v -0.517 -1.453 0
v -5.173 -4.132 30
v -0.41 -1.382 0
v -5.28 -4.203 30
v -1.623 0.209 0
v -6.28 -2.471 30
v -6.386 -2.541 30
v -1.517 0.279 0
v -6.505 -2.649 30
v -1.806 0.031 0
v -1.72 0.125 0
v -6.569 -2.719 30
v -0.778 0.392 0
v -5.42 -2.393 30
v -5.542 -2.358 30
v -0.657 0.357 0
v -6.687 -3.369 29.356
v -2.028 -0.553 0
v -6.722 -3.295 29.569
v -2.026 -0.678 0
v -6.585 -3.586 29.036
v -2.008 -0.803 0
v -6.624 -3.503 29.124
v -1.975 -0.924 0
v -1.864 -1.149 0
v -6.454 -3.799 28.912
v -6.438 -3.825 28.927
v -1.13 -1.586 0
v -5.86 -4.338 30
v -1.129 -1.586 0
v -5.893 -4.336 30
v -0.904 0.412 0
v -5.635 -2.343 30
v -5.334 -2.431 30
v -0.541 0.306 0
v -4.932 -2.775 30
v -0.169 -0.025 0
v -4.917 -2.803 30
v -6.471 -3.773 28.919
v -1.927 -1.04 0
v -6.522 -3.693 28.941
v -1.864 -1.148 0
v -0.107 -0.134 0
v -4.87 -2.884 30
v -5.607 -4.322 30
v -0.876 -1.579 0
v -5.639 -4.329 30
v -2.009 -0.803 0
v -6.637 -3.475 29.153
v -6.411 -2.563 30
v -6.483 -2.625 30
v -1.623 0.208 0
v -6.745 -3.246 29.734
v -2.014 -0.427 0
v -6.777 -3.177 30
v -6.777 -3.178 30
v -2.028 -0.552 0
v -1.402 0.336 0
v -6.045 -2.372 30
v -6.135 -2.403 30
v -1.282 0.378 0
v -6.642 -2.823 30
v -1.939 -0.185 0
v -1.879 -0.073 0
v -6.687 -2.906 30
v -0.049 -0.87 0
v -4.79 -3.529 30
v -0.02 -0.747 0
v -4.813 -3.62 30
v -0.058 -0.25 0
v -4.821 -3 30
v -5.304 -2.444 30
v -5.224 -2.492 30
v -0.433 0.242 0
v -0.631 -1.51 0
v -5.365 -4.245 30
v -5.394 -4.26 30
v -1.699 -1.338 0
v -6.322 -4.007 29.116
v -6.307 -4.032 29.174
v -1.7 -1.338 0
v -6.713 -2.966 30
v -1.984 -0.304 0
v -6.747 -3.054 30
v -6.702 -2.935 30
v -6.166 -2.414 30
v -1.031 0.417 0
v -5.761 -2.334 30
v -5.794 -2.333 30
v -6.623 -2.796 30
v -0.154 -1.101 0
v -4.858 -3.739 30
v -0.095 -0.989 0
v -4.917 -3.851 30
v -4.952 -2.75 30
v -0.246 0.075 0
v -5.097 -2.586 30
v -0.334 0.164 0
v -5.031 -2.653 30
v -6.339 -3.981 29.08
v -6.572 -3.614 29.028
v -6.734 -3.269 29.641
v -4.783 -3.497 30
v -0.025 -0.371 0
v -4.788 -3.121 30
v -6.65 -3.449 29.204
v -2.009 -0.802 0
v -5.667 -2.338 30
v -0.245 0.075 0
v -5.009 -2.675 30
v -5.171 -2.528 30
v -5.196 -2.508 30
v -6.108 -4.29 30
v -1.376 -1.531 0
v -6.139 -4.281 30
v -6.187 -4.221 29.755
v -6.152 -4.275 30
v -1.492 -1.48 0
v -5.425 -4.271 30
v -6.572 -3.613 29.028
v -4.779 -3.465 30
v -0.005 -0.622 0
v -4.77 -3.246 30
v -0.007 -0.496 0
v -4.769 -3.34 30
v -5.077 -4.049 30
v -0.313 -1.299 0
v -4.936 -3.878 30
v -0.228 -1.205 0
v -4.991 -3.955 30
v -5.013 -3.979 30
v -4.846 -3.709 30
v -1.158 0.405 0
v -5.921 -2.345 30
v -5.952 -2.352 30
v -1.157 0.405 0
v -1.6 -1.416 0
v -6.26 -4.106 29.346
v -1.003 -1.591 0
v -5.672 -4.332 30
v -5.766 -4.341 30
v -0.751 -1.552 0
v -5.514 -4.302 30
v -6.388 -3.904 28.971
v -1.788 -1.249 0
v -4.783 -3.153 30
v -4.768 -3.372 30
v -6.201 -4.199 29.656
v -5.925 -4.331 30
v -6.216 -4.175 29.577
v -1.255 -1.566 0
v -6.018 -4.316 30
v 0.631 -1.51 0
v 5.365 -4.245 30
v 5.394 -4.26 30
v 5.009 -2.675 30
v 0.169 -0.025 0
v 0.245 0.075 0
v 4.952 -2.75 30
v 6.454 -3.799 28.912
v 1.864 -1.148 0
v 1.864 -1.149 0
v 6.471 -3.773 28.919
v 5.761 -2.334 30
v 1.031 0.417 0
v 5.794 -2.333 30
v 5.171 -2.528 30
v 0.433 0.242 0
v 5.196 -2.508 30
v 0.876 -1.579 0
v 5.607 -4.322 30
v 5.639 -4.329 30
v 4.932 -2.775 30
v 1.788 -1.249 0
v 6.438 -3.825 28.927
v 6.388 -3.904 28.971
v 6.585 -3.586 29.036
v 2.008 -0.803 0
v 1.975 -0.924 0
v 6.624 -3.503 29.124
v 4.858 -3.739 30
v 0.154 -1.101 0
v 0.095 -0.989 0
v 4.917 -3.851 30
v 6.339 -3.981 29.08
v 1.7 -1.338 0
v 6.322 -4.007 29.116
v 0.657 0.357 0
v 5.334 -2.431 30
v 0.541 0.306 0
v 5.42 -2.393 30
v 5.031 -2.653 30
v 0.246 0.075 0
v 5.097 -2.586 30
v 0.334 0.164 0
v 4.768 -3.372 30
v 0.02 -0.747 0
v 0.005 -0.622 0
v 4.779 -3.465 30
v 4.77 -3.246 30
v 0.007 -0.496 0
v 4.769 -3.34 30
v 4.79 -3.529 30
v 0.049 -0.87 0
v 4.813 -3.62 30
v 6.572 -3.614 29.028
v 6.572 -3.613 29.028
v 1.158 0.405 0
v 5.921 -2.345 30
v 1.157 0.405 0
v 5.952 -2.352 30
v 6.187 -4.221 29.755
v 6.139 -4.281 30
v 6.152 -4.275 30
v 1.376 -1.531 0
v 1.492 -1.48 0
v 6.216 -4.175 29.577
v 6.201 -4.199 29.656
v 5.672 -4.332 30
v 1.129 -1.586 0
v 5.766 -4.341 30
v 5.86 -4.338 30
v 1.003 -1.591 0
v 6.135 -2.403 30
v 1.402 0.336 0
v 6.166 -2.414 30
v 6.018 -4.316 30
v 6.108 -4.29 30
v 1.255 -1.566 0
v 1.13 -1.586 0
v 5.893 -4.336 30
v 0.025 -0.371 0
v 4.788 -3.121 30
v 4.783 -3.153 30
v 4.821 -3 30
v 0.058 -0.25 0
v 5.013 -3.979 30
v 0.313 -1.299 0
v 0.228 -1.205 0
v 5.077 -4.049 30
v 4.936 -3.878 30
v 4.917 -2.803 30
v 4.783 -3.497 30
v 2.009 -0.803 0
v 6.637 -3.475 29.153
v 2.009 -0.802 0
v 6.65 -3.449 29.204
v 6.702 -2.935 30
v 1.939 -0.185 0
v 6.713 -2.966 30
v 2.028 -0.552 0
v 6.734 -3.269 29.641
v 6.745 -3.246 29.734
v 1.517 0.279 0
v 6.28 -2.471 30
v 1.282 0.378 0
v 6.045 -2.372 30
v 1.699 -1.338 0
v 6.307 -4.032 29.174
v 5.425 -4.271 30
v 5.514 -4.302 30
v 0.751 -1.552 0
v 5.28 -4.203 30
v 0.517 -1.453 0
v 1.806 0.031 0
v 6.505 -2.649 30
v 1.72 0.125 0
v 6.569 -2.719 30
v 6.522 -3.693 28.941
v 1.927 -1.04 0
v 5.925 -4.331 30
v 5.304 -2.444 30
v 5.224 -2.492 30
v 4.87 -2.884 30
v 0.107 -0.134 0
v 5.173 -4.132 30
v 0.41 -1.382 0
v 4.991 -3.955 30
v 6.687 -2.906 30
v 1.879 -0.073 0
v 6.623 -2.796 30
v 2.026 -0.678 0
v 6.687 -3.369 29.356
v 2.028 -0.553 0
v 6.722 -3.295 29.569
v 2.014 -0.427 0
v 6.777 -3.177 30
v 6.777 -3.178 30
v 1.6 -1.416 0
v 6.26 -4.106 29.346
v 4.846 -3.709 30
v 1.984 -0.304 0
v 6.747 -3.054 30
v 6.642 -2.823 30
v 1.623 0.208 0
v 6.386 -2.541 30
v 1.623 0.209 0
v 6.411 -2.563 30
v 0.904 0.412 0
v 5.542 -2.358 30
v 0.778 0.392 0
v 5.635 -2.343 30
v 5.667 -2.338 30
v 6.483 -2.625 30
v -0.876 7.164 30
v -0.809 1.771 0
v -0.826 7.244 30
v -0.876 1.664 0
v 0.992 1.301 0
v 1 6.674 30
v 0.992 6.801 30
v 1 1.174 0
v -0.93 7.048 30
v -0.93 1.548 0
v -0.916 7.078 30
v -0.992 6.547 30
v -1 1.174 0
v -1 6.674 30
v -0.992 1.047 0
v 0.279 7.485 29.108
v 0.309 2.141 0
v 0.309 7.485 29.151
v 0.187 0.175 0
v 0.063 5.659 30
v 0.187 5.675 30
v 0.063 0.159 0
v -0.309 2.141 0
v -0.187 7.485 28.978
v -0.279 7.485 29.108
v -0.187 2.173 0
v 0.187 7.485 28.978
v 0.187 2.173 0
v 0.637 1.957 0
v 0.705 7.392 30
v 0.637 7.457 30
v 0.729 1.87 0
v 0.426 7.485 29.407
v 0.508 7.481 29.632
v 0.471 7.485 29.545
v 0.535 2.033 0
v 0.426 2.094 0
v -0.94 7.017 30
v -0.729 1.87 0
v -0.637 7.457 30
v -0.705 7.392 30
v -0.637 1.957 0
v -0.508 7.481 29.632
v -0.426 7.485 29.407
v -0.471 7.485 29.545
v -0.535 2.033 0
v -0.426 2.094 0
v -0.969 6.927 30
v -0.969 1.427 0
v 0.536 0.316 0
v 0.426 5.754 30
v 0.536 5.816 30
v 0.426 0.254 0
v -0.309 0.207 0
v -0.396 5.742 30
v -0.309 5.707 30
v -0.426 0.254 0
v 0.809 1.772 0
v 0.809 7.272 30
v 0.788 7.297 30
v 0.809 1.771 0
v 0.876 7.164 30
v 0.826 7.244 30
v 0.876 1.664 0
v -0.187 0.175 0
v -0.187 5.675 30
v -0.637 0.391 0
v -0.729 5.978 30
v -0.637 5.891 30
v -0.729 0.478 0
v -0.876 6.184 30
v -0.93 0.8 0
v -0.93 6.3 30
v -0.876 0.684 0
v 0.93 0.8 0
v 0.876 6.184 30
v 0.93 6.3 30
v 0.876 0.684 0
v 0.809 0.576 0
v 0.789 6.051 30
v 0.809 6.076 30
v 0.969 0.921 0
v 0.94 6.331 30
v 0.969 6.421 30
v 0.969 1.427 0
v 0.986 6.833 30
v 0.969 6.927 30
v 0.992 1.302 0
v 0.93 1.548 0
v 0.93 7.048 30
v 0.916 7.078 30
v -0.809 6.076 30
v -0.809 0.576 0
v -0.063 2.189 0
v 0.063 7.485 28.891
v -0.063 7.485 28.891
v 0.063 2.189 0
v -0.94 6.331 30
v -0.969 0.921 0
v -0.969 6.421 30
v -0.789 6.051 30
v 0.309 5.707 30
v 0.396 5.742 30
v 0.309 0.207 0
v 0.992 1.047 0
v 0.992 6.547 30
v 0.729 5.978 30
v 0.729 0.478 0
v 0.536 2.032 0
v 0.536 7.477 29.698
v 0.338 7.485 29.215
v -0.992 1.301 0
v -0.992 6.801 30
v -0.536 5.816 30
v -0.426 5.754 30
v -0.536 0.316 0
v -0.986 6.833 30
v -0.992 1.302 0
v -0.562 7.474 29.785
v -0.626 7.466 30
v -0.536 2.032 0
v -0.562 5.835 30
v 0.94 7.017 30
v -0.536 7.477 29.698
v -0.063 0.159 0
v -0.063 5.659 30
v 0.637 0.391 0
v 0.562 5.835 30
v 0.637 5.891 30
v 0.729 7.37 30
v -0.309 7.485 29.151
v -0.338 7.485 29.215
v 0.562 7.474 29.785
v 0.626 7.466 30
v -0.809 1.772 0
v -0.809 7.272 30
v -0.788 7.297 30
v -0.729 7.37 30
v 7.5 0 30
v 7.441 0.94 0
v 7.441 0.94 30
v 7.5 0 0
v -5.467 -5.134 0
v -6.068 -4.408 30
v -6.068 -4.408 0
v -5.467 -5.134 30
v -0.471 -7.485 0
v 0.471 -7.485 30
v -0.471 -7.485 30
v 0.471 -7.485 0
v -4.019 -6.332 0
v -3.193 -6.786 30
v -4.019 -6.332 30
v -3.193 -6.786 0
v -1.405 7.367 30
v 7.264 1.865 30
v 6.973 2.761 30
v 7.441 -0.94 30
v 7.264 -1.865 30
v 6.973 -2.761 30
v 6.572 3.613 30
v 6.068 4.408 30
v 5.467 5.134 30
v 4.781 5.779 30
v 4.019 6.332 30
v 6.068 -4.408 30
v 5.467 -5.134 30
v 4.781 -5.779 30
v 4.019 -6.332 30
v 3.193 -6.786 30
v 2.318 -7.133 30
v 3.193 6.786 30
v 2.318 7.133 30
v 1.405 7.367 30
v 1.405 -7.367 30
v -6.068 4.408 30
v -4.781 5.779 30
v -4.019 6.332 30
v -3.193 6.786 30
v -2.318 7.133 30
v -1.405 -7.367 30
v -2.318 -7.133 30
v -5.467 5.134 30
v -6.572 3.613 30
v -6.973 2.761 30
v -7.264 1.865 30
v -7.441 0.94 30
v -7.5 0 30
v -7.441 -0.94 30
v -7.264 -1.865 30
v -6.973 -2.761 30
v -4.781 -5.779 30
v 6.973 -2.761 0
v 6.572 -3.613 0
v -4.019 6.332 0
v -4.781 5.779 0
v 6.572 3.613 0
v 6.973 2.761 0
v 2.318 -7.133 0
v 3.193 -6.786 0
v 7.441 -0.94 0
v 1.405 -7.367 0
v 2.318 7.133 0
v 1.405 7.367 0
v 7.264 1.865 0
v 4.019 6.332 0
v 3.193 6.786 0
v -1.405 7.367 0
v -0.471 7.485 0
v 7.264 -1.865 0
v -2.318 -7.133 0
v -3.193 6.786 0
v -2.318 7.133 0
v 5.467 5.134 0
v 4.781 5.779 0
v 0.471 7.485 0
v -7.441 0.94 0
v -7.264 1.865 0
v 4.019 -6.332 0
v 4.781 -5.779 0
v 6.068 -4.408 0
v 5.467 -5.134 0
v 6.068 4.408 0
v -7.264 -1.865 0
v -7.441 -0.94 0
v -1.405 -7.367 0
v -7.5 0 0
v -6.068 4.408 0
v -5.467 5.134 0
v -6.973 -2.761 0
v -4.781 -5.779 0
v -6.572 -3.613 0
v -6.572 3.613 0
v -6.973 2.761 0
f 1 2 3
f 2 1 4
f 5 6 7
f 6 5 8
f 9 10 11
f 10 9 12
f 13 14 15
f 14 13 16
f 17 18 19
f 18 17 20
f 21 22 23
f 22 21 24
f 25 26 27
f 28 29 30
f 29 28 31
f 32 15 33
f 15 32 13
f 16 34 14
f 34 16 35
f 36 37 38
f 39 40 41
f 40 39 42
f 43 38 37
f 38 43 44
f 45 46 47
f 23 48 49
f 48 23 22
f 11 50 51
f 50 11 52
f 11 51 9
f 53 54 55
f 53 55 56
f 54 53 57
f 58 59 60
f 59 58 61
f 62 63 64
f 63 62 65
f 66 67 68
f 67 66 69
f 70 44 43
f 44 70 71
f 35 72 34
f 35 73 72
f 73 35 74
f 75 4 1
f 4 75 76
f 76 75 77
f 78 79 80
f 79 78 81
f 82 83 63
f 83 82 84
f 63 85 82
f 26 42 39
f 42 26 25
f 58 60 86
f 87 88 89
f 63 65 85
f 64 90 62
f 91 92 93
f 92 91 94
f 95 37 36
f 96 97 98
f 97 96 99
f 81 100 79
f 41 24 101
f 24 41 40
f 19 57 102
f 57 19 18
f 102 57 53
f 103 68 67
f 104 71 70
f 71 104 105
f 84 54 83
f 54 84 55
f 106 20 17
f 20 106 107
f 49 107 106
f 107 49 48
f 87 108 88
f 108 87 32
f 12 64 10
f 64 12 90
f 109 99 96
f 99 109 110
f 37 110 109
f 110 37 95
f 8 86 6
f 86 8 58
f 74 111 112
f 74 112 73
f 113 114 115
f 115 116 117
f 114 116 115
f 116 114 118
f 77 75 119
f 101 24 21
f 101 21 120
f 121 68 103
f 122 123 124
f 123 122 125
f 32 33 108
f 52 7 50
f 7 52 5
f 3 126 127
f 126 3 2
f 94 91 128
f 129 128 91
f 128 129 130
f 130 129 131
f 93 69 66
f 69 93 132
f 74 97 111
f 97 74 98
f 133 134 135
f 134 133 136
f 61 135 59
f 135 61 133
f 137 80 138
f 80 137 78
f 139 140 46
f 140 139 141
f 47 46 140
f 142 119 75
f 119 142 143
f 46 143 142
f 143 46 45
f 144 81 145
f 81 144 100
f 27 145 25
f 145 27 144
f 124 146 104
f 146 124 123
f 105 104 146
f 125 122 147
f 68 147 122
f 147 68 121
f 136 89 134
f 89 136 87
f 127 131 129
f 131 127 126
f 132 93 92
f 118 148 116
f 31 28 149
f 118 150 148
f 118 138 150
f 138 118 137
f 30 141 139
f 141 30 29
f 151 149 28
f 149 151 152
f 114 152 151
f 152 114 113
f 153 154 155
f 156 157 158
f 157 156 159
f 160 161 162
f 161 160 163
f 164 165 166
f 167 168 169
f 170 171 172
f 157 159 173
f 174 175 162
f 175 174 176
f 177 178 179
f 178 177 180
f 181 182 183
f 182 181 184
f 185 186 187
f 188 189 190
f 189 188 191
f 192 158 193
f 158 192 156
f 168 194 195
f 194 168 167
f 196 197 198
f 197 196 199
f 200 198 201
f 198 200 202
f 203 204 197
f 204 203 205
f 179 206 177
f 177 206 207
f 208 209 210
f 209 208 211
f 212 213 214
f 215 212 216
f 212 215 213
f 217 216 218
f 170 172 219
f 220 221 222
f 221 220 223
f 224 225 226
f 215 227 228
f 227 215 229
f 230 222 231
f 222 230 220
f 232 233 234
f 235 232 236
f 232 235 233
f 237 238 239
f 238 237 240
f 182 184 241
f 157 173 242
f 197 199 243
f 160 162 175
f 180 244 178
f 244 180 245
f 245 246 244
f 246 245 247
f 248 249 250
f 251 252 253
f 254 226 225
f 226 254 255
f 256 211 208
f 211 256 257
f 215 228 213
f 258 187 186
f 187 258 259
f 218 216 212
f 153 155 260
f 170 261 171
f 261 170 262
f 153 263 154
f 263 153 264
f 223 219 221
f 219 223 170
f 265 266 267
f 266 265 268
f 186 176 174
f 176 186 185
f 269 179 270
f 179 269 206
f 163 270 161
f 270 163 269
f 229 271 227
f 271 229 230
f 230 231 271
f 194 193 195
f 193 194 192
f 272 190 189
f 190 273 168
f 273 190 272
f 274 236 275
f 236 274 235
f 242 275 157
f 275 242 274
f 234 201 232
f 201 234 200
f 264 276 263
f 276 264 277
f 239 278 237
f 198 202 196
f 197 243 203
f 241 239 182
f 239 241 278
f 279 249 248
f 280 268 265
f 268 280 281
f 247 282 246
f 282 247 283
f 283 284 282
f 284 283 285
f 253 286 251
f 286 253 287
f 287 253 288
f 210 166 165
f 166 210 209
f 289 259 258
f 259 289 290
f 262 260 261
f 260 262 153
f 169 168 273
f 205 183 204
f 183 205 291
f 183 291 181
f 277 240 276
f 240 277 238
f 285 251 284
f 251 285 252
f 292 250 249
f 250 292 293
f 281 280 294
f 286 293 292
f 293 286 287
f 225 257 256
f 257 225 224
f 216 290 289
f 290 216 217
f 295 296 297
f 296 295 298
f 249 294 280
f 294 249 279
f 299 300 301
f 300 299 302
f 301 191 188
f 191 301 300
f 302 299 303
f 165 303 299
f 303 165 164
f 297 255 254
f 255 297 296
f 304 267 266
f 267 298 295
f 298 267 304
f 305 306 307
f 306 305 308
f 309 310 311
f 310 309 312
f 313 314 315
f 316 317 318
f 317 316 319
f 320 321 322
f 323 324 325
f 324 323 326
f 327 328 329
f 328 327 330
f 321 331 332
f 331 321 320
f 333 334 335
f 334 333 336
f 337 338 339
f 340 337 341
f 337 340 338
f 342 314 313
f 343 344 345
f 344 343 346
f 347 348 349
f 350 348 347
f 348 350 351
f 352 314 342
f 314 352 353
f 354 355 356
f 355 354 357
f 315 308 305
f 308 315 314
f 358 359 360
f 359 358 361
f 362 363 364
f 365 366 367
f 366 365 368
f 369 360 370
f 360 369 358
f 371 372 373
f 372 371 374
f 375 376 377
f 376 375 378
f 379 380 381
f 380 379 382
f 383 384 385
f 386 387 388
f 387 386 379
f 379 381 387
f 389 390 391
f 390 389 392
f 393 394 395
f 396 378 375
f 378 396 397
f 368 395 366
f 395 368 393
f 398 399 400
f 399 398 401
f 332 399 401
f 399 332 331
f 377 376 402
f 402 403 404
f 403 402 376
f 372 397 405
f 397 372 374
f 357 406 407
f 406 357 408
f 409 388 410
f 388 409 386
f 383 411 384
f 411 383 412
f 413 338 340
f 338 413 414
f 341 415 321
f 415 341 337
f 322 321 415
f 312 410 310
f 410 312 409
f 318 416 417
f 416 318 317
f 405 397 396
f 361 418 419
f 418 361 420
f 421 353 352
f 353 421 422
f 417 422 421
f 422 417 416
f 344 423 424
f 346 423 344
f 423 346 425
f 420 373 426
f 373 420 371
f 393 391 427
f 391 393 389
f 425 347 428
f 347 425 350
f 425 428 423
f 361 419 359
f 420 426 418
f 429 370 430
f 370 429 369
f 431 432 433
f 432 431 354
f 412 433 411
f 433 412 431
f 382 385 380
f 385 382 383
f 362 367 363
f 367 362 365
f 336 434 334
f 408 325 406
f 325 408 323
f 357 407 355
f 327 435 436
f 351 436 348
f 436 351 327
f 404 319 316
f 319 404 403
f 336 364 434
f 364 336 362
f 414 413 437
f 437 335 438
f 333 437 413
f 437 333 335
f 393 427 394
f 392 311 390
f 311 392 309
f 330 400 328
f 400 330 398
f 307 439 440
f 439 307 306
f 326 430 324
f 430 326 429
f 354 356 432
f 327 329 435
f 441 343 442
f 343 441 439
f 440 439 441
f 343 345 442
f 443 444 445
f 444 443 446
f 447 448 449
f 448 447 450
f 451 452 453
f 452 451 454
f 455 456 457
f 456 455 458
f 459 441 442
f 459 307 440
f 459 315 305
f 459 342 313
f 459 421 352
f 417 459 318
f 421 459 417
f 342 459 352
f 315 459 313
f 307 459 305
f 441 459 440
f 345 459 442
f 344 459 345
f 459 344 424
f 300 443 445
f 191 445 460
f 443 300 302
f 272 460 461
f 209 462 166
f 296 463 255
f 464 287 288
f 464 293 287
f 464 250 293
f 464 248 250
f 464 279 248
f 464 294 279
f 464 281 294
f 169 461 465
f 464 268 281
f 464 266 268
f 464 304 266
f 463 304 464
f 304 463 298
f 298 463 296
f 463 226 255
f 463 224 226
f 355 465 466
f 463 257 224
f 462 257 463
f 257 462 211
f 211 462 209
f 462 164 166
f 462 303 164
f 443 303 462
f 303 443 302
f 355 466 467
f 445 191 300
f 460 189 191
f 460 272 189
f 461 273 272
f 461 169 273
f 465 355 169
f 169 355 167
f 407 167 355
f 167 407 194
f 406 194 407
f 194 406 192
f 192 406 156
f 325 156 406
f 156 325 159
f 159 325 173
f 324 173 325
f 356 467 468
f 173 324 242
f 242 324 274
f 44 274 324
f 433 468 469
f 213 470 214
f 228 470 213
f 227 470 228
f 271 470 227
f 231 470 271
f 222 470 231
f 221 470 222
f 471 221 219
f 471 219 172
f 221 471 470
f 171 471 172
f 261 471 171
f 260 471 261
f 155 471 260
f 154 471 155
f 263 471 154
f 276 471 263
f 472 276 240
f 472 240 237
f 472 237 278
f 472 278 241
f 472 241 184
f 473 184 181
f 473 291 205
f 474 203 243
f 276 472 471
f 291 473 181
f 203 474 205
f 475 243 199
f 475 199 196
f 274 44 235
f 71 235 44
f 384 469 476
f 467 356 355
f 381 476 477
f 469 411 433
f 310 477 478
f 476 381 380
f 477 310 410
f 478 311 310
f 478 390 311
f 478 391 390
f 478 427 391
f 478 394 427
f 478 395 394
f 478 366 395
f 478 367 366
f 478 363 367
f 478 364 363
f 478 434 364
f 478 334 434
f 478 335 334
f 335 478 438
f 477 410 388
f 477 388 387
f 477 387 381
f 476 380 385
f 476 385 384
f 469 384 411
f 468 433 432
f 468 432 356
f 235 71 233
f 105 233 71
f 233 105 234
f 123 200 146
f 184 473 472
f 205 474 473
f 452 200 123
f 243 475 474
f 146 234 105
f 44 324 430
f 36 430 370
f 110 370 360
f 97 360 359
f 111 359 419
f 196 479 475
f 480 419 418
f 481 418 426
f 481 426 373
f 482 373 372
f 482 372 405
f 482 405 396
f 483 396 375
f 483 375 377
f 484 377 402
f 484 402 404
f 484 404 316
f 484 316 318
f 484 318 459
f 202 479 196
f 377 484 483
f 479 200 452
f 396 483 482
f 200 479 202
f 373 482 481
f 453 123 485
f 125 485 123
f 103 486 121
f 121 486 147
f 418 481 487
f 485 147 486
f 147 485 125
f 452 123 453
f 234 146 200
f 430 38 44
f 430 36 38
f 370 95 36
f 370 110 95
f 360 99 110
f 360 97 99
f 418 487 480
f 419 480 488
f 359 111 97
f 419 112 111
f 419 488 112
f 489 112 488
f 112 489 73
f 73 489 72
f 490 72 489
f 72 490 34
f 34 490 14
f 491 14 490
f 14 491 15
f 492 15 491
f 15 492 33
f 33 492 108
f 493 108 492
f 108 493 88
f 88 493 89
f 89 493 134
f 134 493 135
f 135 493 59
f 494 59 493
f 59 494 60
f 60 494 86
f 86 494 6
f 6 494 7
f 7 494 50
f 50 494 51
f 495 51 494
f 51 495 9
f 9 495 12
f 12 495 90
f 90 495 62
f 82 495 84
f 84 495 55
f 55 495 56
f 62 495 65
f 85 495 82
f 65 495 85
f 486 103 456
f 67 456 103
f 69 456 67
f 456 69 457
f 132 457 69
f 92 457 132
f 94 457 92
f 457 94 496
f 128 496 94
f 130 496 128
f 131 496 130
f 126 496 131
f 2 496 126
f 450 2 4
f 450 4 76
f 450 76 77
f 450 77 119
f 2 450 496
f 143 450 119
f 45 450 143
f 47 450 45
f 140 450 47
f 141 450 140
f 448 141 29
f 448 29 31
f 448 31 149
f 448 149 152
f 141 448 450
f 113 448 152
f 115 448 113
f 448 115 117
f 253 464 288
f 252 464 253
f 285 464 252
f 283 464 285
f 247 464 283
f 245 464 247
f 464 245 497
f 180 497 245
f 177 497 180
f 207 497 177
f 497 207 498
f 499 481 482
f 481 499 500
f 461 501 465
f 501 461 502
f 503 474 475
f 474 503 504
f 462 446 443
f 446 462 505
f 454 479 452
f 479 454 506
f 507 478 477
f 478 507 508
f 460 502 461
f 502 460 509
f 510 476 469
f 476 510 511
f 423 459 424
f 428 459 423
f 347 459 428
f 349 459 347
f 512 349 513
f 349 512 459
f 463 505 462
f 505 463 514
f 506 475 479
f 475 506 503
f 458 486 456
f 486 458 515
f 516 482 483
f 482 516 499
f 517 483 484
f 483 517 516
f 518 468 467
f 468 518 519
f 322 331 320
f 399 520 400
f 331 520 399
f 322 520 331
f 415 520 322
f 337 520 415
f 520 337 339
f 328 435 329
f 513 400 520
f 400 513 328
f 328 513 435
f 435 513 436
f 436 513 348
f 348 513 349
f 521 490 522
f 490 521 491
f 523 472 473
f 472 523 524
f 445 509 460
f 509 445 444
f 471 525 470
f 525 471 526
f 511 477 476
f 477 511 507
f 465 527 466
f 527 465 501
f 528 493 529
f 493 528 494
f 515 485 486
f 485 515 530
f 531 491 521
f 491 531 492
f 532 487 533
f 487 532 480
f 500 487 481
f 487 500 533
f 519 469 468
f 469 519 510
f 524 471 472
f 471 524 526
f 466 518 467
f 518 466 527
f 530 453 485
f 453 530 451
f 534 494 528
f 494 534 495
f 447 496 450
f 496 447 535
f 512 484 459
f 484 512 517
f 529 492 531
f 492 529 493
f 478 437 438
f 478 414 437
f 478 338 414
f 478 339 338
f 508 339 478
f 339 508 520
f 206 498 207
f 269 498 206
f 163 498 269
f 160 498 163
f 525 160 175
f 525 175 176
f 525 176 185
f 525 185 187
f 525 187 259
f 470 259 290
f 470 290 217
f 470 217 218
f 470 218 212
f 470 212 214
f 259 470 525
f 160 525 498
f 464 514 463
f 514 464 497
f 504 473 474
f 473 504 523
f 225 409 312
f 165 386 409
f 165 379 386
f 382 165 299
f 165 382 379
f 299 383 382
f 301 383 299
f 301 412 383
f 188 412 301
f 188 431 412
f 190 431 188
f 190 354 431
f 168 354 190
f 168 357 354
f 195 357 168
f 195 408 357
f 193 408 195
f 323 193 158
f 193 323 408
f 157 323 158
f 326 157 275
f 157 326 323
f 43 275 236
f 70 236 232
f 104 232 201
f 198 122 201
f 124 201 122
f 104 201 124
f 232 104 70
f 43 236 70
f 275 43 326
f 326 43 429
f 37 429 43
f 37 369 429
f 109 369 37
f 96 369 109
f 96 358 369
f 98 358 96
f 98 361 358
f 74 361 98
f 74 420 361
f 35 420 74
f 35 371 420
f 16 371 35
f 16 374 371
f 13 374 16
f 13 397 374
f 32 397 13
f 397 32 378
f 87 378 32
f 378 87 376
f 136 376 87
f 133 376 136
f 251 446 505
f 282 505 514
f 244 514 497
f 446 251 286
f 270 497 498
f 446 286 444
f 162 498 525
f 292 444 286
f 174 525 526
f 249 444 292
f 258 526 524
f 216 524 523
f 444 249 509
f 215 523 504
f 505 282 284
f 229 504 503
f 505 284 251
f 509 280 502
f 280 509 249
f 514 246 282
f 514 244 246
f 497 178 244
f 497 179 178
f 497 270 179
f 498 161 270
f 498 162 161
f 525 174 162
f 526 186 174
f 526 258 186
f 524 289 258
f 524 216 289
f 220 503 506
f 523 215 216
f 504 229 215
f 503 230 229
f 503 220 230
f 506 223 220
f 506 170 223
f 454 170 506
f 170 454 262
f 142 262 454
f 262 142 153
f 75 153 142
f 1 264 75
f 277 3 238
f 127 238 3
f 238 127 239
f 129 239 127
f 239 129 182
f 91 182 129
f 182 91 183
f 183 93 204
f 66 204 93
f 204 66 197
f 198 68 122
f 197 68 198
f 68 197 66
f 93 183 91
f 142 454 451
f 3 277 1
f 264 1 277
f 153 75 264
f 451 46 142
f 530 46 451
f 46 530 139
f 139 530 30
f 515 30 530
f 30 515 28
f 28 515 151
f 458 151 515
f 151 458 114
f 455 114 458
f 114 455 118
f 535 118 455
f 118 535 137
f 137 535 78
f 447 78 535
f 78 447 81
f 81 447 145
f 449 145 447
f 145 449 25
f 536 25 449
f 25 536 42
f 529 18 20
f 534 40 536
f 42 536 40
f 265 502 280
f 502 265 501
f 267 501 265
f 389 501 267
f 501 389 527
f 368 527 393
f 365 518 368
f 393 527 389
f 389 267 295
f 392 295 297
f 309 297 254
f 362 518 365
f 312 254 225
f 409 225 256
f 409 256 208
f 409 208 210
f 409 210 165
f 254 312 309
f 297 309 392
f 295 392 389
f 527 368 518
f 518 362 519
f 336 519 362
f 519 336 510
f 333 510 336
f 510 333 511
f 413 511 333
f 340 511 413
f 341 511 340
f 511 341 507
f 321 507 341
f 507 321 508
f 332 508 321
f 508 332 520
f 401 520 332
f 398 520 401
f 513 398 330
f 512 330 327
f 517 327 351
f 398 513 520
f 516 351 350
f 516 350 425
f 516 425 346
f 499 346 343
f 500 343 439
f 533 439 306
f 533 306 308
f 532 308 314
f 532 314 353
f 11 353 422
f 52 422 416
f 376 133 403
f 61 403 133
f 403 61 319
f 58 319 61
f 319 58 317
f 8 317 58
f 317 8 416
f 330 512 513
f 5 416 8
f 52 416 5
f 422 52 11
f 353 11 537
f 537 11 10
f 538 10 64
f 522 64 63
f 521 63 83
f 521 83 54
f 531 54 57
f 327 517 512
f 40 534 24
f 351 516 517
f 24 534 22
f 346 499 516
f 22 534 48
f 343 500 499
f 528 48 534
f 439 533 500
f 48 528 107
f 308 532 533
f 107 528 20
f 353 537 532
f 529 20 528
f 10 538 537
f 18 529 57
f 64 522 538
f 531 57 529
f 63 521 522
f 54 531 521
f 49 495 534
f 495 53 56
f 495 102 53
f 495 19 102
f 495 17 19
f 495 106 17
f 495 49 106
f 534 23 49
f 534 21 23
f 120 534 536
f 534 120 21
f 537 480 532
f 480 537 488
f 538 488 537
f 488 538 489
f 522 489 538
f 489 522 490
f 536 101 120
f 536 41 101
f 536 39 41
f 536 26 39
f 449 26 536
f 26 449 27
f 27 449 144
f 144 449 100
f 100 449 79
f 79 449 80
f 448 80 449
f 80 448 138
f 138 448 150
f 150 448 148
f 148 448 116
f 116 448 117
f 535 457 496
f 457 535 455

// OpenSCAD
// preview[view:north, tilt:top]

center = 0; //[0:No Center, 1:Center]
wireRad = 1;
jigRad = 7.5;
jigHeight=30;
numStrand = 3; //[3:20]
// Smoothness of the stl
$fn=50;

difference()
{
	cylinder(h=jigHeight, r=jigRad);

	union()
	{
		for (i=[1:1:numStrand])
		{
			if (center)
			{
				rotate([-atan((jigRad-(wireRad/(sin(180/numStrand))+wireRad*(1-cos(180/numStrand))))/jigHeight),0,i*360/numStrand])
				translate([0,wireRad/(sin(180/numStrand))+wireRad*(1-cos(180/numStrand)),0])
				cylinder(h=jigHeight*4, r=wireRad, center=false);
			}
			else
			{
				rotate([-atan((jigRad-(wireRad/(cos(180/numStrand))))/jigHeight),0,i*360/numStrand])
				translate([0,wireRad/(sin(180/numStrand)),0])
				cylinder(h=jigHeight*4, r=wireRad, center=false);
			}
		}
		if (center)
		{
			cylinder(h=jigHeight*4, r=wireRad, center=true);
		}
	}
}
